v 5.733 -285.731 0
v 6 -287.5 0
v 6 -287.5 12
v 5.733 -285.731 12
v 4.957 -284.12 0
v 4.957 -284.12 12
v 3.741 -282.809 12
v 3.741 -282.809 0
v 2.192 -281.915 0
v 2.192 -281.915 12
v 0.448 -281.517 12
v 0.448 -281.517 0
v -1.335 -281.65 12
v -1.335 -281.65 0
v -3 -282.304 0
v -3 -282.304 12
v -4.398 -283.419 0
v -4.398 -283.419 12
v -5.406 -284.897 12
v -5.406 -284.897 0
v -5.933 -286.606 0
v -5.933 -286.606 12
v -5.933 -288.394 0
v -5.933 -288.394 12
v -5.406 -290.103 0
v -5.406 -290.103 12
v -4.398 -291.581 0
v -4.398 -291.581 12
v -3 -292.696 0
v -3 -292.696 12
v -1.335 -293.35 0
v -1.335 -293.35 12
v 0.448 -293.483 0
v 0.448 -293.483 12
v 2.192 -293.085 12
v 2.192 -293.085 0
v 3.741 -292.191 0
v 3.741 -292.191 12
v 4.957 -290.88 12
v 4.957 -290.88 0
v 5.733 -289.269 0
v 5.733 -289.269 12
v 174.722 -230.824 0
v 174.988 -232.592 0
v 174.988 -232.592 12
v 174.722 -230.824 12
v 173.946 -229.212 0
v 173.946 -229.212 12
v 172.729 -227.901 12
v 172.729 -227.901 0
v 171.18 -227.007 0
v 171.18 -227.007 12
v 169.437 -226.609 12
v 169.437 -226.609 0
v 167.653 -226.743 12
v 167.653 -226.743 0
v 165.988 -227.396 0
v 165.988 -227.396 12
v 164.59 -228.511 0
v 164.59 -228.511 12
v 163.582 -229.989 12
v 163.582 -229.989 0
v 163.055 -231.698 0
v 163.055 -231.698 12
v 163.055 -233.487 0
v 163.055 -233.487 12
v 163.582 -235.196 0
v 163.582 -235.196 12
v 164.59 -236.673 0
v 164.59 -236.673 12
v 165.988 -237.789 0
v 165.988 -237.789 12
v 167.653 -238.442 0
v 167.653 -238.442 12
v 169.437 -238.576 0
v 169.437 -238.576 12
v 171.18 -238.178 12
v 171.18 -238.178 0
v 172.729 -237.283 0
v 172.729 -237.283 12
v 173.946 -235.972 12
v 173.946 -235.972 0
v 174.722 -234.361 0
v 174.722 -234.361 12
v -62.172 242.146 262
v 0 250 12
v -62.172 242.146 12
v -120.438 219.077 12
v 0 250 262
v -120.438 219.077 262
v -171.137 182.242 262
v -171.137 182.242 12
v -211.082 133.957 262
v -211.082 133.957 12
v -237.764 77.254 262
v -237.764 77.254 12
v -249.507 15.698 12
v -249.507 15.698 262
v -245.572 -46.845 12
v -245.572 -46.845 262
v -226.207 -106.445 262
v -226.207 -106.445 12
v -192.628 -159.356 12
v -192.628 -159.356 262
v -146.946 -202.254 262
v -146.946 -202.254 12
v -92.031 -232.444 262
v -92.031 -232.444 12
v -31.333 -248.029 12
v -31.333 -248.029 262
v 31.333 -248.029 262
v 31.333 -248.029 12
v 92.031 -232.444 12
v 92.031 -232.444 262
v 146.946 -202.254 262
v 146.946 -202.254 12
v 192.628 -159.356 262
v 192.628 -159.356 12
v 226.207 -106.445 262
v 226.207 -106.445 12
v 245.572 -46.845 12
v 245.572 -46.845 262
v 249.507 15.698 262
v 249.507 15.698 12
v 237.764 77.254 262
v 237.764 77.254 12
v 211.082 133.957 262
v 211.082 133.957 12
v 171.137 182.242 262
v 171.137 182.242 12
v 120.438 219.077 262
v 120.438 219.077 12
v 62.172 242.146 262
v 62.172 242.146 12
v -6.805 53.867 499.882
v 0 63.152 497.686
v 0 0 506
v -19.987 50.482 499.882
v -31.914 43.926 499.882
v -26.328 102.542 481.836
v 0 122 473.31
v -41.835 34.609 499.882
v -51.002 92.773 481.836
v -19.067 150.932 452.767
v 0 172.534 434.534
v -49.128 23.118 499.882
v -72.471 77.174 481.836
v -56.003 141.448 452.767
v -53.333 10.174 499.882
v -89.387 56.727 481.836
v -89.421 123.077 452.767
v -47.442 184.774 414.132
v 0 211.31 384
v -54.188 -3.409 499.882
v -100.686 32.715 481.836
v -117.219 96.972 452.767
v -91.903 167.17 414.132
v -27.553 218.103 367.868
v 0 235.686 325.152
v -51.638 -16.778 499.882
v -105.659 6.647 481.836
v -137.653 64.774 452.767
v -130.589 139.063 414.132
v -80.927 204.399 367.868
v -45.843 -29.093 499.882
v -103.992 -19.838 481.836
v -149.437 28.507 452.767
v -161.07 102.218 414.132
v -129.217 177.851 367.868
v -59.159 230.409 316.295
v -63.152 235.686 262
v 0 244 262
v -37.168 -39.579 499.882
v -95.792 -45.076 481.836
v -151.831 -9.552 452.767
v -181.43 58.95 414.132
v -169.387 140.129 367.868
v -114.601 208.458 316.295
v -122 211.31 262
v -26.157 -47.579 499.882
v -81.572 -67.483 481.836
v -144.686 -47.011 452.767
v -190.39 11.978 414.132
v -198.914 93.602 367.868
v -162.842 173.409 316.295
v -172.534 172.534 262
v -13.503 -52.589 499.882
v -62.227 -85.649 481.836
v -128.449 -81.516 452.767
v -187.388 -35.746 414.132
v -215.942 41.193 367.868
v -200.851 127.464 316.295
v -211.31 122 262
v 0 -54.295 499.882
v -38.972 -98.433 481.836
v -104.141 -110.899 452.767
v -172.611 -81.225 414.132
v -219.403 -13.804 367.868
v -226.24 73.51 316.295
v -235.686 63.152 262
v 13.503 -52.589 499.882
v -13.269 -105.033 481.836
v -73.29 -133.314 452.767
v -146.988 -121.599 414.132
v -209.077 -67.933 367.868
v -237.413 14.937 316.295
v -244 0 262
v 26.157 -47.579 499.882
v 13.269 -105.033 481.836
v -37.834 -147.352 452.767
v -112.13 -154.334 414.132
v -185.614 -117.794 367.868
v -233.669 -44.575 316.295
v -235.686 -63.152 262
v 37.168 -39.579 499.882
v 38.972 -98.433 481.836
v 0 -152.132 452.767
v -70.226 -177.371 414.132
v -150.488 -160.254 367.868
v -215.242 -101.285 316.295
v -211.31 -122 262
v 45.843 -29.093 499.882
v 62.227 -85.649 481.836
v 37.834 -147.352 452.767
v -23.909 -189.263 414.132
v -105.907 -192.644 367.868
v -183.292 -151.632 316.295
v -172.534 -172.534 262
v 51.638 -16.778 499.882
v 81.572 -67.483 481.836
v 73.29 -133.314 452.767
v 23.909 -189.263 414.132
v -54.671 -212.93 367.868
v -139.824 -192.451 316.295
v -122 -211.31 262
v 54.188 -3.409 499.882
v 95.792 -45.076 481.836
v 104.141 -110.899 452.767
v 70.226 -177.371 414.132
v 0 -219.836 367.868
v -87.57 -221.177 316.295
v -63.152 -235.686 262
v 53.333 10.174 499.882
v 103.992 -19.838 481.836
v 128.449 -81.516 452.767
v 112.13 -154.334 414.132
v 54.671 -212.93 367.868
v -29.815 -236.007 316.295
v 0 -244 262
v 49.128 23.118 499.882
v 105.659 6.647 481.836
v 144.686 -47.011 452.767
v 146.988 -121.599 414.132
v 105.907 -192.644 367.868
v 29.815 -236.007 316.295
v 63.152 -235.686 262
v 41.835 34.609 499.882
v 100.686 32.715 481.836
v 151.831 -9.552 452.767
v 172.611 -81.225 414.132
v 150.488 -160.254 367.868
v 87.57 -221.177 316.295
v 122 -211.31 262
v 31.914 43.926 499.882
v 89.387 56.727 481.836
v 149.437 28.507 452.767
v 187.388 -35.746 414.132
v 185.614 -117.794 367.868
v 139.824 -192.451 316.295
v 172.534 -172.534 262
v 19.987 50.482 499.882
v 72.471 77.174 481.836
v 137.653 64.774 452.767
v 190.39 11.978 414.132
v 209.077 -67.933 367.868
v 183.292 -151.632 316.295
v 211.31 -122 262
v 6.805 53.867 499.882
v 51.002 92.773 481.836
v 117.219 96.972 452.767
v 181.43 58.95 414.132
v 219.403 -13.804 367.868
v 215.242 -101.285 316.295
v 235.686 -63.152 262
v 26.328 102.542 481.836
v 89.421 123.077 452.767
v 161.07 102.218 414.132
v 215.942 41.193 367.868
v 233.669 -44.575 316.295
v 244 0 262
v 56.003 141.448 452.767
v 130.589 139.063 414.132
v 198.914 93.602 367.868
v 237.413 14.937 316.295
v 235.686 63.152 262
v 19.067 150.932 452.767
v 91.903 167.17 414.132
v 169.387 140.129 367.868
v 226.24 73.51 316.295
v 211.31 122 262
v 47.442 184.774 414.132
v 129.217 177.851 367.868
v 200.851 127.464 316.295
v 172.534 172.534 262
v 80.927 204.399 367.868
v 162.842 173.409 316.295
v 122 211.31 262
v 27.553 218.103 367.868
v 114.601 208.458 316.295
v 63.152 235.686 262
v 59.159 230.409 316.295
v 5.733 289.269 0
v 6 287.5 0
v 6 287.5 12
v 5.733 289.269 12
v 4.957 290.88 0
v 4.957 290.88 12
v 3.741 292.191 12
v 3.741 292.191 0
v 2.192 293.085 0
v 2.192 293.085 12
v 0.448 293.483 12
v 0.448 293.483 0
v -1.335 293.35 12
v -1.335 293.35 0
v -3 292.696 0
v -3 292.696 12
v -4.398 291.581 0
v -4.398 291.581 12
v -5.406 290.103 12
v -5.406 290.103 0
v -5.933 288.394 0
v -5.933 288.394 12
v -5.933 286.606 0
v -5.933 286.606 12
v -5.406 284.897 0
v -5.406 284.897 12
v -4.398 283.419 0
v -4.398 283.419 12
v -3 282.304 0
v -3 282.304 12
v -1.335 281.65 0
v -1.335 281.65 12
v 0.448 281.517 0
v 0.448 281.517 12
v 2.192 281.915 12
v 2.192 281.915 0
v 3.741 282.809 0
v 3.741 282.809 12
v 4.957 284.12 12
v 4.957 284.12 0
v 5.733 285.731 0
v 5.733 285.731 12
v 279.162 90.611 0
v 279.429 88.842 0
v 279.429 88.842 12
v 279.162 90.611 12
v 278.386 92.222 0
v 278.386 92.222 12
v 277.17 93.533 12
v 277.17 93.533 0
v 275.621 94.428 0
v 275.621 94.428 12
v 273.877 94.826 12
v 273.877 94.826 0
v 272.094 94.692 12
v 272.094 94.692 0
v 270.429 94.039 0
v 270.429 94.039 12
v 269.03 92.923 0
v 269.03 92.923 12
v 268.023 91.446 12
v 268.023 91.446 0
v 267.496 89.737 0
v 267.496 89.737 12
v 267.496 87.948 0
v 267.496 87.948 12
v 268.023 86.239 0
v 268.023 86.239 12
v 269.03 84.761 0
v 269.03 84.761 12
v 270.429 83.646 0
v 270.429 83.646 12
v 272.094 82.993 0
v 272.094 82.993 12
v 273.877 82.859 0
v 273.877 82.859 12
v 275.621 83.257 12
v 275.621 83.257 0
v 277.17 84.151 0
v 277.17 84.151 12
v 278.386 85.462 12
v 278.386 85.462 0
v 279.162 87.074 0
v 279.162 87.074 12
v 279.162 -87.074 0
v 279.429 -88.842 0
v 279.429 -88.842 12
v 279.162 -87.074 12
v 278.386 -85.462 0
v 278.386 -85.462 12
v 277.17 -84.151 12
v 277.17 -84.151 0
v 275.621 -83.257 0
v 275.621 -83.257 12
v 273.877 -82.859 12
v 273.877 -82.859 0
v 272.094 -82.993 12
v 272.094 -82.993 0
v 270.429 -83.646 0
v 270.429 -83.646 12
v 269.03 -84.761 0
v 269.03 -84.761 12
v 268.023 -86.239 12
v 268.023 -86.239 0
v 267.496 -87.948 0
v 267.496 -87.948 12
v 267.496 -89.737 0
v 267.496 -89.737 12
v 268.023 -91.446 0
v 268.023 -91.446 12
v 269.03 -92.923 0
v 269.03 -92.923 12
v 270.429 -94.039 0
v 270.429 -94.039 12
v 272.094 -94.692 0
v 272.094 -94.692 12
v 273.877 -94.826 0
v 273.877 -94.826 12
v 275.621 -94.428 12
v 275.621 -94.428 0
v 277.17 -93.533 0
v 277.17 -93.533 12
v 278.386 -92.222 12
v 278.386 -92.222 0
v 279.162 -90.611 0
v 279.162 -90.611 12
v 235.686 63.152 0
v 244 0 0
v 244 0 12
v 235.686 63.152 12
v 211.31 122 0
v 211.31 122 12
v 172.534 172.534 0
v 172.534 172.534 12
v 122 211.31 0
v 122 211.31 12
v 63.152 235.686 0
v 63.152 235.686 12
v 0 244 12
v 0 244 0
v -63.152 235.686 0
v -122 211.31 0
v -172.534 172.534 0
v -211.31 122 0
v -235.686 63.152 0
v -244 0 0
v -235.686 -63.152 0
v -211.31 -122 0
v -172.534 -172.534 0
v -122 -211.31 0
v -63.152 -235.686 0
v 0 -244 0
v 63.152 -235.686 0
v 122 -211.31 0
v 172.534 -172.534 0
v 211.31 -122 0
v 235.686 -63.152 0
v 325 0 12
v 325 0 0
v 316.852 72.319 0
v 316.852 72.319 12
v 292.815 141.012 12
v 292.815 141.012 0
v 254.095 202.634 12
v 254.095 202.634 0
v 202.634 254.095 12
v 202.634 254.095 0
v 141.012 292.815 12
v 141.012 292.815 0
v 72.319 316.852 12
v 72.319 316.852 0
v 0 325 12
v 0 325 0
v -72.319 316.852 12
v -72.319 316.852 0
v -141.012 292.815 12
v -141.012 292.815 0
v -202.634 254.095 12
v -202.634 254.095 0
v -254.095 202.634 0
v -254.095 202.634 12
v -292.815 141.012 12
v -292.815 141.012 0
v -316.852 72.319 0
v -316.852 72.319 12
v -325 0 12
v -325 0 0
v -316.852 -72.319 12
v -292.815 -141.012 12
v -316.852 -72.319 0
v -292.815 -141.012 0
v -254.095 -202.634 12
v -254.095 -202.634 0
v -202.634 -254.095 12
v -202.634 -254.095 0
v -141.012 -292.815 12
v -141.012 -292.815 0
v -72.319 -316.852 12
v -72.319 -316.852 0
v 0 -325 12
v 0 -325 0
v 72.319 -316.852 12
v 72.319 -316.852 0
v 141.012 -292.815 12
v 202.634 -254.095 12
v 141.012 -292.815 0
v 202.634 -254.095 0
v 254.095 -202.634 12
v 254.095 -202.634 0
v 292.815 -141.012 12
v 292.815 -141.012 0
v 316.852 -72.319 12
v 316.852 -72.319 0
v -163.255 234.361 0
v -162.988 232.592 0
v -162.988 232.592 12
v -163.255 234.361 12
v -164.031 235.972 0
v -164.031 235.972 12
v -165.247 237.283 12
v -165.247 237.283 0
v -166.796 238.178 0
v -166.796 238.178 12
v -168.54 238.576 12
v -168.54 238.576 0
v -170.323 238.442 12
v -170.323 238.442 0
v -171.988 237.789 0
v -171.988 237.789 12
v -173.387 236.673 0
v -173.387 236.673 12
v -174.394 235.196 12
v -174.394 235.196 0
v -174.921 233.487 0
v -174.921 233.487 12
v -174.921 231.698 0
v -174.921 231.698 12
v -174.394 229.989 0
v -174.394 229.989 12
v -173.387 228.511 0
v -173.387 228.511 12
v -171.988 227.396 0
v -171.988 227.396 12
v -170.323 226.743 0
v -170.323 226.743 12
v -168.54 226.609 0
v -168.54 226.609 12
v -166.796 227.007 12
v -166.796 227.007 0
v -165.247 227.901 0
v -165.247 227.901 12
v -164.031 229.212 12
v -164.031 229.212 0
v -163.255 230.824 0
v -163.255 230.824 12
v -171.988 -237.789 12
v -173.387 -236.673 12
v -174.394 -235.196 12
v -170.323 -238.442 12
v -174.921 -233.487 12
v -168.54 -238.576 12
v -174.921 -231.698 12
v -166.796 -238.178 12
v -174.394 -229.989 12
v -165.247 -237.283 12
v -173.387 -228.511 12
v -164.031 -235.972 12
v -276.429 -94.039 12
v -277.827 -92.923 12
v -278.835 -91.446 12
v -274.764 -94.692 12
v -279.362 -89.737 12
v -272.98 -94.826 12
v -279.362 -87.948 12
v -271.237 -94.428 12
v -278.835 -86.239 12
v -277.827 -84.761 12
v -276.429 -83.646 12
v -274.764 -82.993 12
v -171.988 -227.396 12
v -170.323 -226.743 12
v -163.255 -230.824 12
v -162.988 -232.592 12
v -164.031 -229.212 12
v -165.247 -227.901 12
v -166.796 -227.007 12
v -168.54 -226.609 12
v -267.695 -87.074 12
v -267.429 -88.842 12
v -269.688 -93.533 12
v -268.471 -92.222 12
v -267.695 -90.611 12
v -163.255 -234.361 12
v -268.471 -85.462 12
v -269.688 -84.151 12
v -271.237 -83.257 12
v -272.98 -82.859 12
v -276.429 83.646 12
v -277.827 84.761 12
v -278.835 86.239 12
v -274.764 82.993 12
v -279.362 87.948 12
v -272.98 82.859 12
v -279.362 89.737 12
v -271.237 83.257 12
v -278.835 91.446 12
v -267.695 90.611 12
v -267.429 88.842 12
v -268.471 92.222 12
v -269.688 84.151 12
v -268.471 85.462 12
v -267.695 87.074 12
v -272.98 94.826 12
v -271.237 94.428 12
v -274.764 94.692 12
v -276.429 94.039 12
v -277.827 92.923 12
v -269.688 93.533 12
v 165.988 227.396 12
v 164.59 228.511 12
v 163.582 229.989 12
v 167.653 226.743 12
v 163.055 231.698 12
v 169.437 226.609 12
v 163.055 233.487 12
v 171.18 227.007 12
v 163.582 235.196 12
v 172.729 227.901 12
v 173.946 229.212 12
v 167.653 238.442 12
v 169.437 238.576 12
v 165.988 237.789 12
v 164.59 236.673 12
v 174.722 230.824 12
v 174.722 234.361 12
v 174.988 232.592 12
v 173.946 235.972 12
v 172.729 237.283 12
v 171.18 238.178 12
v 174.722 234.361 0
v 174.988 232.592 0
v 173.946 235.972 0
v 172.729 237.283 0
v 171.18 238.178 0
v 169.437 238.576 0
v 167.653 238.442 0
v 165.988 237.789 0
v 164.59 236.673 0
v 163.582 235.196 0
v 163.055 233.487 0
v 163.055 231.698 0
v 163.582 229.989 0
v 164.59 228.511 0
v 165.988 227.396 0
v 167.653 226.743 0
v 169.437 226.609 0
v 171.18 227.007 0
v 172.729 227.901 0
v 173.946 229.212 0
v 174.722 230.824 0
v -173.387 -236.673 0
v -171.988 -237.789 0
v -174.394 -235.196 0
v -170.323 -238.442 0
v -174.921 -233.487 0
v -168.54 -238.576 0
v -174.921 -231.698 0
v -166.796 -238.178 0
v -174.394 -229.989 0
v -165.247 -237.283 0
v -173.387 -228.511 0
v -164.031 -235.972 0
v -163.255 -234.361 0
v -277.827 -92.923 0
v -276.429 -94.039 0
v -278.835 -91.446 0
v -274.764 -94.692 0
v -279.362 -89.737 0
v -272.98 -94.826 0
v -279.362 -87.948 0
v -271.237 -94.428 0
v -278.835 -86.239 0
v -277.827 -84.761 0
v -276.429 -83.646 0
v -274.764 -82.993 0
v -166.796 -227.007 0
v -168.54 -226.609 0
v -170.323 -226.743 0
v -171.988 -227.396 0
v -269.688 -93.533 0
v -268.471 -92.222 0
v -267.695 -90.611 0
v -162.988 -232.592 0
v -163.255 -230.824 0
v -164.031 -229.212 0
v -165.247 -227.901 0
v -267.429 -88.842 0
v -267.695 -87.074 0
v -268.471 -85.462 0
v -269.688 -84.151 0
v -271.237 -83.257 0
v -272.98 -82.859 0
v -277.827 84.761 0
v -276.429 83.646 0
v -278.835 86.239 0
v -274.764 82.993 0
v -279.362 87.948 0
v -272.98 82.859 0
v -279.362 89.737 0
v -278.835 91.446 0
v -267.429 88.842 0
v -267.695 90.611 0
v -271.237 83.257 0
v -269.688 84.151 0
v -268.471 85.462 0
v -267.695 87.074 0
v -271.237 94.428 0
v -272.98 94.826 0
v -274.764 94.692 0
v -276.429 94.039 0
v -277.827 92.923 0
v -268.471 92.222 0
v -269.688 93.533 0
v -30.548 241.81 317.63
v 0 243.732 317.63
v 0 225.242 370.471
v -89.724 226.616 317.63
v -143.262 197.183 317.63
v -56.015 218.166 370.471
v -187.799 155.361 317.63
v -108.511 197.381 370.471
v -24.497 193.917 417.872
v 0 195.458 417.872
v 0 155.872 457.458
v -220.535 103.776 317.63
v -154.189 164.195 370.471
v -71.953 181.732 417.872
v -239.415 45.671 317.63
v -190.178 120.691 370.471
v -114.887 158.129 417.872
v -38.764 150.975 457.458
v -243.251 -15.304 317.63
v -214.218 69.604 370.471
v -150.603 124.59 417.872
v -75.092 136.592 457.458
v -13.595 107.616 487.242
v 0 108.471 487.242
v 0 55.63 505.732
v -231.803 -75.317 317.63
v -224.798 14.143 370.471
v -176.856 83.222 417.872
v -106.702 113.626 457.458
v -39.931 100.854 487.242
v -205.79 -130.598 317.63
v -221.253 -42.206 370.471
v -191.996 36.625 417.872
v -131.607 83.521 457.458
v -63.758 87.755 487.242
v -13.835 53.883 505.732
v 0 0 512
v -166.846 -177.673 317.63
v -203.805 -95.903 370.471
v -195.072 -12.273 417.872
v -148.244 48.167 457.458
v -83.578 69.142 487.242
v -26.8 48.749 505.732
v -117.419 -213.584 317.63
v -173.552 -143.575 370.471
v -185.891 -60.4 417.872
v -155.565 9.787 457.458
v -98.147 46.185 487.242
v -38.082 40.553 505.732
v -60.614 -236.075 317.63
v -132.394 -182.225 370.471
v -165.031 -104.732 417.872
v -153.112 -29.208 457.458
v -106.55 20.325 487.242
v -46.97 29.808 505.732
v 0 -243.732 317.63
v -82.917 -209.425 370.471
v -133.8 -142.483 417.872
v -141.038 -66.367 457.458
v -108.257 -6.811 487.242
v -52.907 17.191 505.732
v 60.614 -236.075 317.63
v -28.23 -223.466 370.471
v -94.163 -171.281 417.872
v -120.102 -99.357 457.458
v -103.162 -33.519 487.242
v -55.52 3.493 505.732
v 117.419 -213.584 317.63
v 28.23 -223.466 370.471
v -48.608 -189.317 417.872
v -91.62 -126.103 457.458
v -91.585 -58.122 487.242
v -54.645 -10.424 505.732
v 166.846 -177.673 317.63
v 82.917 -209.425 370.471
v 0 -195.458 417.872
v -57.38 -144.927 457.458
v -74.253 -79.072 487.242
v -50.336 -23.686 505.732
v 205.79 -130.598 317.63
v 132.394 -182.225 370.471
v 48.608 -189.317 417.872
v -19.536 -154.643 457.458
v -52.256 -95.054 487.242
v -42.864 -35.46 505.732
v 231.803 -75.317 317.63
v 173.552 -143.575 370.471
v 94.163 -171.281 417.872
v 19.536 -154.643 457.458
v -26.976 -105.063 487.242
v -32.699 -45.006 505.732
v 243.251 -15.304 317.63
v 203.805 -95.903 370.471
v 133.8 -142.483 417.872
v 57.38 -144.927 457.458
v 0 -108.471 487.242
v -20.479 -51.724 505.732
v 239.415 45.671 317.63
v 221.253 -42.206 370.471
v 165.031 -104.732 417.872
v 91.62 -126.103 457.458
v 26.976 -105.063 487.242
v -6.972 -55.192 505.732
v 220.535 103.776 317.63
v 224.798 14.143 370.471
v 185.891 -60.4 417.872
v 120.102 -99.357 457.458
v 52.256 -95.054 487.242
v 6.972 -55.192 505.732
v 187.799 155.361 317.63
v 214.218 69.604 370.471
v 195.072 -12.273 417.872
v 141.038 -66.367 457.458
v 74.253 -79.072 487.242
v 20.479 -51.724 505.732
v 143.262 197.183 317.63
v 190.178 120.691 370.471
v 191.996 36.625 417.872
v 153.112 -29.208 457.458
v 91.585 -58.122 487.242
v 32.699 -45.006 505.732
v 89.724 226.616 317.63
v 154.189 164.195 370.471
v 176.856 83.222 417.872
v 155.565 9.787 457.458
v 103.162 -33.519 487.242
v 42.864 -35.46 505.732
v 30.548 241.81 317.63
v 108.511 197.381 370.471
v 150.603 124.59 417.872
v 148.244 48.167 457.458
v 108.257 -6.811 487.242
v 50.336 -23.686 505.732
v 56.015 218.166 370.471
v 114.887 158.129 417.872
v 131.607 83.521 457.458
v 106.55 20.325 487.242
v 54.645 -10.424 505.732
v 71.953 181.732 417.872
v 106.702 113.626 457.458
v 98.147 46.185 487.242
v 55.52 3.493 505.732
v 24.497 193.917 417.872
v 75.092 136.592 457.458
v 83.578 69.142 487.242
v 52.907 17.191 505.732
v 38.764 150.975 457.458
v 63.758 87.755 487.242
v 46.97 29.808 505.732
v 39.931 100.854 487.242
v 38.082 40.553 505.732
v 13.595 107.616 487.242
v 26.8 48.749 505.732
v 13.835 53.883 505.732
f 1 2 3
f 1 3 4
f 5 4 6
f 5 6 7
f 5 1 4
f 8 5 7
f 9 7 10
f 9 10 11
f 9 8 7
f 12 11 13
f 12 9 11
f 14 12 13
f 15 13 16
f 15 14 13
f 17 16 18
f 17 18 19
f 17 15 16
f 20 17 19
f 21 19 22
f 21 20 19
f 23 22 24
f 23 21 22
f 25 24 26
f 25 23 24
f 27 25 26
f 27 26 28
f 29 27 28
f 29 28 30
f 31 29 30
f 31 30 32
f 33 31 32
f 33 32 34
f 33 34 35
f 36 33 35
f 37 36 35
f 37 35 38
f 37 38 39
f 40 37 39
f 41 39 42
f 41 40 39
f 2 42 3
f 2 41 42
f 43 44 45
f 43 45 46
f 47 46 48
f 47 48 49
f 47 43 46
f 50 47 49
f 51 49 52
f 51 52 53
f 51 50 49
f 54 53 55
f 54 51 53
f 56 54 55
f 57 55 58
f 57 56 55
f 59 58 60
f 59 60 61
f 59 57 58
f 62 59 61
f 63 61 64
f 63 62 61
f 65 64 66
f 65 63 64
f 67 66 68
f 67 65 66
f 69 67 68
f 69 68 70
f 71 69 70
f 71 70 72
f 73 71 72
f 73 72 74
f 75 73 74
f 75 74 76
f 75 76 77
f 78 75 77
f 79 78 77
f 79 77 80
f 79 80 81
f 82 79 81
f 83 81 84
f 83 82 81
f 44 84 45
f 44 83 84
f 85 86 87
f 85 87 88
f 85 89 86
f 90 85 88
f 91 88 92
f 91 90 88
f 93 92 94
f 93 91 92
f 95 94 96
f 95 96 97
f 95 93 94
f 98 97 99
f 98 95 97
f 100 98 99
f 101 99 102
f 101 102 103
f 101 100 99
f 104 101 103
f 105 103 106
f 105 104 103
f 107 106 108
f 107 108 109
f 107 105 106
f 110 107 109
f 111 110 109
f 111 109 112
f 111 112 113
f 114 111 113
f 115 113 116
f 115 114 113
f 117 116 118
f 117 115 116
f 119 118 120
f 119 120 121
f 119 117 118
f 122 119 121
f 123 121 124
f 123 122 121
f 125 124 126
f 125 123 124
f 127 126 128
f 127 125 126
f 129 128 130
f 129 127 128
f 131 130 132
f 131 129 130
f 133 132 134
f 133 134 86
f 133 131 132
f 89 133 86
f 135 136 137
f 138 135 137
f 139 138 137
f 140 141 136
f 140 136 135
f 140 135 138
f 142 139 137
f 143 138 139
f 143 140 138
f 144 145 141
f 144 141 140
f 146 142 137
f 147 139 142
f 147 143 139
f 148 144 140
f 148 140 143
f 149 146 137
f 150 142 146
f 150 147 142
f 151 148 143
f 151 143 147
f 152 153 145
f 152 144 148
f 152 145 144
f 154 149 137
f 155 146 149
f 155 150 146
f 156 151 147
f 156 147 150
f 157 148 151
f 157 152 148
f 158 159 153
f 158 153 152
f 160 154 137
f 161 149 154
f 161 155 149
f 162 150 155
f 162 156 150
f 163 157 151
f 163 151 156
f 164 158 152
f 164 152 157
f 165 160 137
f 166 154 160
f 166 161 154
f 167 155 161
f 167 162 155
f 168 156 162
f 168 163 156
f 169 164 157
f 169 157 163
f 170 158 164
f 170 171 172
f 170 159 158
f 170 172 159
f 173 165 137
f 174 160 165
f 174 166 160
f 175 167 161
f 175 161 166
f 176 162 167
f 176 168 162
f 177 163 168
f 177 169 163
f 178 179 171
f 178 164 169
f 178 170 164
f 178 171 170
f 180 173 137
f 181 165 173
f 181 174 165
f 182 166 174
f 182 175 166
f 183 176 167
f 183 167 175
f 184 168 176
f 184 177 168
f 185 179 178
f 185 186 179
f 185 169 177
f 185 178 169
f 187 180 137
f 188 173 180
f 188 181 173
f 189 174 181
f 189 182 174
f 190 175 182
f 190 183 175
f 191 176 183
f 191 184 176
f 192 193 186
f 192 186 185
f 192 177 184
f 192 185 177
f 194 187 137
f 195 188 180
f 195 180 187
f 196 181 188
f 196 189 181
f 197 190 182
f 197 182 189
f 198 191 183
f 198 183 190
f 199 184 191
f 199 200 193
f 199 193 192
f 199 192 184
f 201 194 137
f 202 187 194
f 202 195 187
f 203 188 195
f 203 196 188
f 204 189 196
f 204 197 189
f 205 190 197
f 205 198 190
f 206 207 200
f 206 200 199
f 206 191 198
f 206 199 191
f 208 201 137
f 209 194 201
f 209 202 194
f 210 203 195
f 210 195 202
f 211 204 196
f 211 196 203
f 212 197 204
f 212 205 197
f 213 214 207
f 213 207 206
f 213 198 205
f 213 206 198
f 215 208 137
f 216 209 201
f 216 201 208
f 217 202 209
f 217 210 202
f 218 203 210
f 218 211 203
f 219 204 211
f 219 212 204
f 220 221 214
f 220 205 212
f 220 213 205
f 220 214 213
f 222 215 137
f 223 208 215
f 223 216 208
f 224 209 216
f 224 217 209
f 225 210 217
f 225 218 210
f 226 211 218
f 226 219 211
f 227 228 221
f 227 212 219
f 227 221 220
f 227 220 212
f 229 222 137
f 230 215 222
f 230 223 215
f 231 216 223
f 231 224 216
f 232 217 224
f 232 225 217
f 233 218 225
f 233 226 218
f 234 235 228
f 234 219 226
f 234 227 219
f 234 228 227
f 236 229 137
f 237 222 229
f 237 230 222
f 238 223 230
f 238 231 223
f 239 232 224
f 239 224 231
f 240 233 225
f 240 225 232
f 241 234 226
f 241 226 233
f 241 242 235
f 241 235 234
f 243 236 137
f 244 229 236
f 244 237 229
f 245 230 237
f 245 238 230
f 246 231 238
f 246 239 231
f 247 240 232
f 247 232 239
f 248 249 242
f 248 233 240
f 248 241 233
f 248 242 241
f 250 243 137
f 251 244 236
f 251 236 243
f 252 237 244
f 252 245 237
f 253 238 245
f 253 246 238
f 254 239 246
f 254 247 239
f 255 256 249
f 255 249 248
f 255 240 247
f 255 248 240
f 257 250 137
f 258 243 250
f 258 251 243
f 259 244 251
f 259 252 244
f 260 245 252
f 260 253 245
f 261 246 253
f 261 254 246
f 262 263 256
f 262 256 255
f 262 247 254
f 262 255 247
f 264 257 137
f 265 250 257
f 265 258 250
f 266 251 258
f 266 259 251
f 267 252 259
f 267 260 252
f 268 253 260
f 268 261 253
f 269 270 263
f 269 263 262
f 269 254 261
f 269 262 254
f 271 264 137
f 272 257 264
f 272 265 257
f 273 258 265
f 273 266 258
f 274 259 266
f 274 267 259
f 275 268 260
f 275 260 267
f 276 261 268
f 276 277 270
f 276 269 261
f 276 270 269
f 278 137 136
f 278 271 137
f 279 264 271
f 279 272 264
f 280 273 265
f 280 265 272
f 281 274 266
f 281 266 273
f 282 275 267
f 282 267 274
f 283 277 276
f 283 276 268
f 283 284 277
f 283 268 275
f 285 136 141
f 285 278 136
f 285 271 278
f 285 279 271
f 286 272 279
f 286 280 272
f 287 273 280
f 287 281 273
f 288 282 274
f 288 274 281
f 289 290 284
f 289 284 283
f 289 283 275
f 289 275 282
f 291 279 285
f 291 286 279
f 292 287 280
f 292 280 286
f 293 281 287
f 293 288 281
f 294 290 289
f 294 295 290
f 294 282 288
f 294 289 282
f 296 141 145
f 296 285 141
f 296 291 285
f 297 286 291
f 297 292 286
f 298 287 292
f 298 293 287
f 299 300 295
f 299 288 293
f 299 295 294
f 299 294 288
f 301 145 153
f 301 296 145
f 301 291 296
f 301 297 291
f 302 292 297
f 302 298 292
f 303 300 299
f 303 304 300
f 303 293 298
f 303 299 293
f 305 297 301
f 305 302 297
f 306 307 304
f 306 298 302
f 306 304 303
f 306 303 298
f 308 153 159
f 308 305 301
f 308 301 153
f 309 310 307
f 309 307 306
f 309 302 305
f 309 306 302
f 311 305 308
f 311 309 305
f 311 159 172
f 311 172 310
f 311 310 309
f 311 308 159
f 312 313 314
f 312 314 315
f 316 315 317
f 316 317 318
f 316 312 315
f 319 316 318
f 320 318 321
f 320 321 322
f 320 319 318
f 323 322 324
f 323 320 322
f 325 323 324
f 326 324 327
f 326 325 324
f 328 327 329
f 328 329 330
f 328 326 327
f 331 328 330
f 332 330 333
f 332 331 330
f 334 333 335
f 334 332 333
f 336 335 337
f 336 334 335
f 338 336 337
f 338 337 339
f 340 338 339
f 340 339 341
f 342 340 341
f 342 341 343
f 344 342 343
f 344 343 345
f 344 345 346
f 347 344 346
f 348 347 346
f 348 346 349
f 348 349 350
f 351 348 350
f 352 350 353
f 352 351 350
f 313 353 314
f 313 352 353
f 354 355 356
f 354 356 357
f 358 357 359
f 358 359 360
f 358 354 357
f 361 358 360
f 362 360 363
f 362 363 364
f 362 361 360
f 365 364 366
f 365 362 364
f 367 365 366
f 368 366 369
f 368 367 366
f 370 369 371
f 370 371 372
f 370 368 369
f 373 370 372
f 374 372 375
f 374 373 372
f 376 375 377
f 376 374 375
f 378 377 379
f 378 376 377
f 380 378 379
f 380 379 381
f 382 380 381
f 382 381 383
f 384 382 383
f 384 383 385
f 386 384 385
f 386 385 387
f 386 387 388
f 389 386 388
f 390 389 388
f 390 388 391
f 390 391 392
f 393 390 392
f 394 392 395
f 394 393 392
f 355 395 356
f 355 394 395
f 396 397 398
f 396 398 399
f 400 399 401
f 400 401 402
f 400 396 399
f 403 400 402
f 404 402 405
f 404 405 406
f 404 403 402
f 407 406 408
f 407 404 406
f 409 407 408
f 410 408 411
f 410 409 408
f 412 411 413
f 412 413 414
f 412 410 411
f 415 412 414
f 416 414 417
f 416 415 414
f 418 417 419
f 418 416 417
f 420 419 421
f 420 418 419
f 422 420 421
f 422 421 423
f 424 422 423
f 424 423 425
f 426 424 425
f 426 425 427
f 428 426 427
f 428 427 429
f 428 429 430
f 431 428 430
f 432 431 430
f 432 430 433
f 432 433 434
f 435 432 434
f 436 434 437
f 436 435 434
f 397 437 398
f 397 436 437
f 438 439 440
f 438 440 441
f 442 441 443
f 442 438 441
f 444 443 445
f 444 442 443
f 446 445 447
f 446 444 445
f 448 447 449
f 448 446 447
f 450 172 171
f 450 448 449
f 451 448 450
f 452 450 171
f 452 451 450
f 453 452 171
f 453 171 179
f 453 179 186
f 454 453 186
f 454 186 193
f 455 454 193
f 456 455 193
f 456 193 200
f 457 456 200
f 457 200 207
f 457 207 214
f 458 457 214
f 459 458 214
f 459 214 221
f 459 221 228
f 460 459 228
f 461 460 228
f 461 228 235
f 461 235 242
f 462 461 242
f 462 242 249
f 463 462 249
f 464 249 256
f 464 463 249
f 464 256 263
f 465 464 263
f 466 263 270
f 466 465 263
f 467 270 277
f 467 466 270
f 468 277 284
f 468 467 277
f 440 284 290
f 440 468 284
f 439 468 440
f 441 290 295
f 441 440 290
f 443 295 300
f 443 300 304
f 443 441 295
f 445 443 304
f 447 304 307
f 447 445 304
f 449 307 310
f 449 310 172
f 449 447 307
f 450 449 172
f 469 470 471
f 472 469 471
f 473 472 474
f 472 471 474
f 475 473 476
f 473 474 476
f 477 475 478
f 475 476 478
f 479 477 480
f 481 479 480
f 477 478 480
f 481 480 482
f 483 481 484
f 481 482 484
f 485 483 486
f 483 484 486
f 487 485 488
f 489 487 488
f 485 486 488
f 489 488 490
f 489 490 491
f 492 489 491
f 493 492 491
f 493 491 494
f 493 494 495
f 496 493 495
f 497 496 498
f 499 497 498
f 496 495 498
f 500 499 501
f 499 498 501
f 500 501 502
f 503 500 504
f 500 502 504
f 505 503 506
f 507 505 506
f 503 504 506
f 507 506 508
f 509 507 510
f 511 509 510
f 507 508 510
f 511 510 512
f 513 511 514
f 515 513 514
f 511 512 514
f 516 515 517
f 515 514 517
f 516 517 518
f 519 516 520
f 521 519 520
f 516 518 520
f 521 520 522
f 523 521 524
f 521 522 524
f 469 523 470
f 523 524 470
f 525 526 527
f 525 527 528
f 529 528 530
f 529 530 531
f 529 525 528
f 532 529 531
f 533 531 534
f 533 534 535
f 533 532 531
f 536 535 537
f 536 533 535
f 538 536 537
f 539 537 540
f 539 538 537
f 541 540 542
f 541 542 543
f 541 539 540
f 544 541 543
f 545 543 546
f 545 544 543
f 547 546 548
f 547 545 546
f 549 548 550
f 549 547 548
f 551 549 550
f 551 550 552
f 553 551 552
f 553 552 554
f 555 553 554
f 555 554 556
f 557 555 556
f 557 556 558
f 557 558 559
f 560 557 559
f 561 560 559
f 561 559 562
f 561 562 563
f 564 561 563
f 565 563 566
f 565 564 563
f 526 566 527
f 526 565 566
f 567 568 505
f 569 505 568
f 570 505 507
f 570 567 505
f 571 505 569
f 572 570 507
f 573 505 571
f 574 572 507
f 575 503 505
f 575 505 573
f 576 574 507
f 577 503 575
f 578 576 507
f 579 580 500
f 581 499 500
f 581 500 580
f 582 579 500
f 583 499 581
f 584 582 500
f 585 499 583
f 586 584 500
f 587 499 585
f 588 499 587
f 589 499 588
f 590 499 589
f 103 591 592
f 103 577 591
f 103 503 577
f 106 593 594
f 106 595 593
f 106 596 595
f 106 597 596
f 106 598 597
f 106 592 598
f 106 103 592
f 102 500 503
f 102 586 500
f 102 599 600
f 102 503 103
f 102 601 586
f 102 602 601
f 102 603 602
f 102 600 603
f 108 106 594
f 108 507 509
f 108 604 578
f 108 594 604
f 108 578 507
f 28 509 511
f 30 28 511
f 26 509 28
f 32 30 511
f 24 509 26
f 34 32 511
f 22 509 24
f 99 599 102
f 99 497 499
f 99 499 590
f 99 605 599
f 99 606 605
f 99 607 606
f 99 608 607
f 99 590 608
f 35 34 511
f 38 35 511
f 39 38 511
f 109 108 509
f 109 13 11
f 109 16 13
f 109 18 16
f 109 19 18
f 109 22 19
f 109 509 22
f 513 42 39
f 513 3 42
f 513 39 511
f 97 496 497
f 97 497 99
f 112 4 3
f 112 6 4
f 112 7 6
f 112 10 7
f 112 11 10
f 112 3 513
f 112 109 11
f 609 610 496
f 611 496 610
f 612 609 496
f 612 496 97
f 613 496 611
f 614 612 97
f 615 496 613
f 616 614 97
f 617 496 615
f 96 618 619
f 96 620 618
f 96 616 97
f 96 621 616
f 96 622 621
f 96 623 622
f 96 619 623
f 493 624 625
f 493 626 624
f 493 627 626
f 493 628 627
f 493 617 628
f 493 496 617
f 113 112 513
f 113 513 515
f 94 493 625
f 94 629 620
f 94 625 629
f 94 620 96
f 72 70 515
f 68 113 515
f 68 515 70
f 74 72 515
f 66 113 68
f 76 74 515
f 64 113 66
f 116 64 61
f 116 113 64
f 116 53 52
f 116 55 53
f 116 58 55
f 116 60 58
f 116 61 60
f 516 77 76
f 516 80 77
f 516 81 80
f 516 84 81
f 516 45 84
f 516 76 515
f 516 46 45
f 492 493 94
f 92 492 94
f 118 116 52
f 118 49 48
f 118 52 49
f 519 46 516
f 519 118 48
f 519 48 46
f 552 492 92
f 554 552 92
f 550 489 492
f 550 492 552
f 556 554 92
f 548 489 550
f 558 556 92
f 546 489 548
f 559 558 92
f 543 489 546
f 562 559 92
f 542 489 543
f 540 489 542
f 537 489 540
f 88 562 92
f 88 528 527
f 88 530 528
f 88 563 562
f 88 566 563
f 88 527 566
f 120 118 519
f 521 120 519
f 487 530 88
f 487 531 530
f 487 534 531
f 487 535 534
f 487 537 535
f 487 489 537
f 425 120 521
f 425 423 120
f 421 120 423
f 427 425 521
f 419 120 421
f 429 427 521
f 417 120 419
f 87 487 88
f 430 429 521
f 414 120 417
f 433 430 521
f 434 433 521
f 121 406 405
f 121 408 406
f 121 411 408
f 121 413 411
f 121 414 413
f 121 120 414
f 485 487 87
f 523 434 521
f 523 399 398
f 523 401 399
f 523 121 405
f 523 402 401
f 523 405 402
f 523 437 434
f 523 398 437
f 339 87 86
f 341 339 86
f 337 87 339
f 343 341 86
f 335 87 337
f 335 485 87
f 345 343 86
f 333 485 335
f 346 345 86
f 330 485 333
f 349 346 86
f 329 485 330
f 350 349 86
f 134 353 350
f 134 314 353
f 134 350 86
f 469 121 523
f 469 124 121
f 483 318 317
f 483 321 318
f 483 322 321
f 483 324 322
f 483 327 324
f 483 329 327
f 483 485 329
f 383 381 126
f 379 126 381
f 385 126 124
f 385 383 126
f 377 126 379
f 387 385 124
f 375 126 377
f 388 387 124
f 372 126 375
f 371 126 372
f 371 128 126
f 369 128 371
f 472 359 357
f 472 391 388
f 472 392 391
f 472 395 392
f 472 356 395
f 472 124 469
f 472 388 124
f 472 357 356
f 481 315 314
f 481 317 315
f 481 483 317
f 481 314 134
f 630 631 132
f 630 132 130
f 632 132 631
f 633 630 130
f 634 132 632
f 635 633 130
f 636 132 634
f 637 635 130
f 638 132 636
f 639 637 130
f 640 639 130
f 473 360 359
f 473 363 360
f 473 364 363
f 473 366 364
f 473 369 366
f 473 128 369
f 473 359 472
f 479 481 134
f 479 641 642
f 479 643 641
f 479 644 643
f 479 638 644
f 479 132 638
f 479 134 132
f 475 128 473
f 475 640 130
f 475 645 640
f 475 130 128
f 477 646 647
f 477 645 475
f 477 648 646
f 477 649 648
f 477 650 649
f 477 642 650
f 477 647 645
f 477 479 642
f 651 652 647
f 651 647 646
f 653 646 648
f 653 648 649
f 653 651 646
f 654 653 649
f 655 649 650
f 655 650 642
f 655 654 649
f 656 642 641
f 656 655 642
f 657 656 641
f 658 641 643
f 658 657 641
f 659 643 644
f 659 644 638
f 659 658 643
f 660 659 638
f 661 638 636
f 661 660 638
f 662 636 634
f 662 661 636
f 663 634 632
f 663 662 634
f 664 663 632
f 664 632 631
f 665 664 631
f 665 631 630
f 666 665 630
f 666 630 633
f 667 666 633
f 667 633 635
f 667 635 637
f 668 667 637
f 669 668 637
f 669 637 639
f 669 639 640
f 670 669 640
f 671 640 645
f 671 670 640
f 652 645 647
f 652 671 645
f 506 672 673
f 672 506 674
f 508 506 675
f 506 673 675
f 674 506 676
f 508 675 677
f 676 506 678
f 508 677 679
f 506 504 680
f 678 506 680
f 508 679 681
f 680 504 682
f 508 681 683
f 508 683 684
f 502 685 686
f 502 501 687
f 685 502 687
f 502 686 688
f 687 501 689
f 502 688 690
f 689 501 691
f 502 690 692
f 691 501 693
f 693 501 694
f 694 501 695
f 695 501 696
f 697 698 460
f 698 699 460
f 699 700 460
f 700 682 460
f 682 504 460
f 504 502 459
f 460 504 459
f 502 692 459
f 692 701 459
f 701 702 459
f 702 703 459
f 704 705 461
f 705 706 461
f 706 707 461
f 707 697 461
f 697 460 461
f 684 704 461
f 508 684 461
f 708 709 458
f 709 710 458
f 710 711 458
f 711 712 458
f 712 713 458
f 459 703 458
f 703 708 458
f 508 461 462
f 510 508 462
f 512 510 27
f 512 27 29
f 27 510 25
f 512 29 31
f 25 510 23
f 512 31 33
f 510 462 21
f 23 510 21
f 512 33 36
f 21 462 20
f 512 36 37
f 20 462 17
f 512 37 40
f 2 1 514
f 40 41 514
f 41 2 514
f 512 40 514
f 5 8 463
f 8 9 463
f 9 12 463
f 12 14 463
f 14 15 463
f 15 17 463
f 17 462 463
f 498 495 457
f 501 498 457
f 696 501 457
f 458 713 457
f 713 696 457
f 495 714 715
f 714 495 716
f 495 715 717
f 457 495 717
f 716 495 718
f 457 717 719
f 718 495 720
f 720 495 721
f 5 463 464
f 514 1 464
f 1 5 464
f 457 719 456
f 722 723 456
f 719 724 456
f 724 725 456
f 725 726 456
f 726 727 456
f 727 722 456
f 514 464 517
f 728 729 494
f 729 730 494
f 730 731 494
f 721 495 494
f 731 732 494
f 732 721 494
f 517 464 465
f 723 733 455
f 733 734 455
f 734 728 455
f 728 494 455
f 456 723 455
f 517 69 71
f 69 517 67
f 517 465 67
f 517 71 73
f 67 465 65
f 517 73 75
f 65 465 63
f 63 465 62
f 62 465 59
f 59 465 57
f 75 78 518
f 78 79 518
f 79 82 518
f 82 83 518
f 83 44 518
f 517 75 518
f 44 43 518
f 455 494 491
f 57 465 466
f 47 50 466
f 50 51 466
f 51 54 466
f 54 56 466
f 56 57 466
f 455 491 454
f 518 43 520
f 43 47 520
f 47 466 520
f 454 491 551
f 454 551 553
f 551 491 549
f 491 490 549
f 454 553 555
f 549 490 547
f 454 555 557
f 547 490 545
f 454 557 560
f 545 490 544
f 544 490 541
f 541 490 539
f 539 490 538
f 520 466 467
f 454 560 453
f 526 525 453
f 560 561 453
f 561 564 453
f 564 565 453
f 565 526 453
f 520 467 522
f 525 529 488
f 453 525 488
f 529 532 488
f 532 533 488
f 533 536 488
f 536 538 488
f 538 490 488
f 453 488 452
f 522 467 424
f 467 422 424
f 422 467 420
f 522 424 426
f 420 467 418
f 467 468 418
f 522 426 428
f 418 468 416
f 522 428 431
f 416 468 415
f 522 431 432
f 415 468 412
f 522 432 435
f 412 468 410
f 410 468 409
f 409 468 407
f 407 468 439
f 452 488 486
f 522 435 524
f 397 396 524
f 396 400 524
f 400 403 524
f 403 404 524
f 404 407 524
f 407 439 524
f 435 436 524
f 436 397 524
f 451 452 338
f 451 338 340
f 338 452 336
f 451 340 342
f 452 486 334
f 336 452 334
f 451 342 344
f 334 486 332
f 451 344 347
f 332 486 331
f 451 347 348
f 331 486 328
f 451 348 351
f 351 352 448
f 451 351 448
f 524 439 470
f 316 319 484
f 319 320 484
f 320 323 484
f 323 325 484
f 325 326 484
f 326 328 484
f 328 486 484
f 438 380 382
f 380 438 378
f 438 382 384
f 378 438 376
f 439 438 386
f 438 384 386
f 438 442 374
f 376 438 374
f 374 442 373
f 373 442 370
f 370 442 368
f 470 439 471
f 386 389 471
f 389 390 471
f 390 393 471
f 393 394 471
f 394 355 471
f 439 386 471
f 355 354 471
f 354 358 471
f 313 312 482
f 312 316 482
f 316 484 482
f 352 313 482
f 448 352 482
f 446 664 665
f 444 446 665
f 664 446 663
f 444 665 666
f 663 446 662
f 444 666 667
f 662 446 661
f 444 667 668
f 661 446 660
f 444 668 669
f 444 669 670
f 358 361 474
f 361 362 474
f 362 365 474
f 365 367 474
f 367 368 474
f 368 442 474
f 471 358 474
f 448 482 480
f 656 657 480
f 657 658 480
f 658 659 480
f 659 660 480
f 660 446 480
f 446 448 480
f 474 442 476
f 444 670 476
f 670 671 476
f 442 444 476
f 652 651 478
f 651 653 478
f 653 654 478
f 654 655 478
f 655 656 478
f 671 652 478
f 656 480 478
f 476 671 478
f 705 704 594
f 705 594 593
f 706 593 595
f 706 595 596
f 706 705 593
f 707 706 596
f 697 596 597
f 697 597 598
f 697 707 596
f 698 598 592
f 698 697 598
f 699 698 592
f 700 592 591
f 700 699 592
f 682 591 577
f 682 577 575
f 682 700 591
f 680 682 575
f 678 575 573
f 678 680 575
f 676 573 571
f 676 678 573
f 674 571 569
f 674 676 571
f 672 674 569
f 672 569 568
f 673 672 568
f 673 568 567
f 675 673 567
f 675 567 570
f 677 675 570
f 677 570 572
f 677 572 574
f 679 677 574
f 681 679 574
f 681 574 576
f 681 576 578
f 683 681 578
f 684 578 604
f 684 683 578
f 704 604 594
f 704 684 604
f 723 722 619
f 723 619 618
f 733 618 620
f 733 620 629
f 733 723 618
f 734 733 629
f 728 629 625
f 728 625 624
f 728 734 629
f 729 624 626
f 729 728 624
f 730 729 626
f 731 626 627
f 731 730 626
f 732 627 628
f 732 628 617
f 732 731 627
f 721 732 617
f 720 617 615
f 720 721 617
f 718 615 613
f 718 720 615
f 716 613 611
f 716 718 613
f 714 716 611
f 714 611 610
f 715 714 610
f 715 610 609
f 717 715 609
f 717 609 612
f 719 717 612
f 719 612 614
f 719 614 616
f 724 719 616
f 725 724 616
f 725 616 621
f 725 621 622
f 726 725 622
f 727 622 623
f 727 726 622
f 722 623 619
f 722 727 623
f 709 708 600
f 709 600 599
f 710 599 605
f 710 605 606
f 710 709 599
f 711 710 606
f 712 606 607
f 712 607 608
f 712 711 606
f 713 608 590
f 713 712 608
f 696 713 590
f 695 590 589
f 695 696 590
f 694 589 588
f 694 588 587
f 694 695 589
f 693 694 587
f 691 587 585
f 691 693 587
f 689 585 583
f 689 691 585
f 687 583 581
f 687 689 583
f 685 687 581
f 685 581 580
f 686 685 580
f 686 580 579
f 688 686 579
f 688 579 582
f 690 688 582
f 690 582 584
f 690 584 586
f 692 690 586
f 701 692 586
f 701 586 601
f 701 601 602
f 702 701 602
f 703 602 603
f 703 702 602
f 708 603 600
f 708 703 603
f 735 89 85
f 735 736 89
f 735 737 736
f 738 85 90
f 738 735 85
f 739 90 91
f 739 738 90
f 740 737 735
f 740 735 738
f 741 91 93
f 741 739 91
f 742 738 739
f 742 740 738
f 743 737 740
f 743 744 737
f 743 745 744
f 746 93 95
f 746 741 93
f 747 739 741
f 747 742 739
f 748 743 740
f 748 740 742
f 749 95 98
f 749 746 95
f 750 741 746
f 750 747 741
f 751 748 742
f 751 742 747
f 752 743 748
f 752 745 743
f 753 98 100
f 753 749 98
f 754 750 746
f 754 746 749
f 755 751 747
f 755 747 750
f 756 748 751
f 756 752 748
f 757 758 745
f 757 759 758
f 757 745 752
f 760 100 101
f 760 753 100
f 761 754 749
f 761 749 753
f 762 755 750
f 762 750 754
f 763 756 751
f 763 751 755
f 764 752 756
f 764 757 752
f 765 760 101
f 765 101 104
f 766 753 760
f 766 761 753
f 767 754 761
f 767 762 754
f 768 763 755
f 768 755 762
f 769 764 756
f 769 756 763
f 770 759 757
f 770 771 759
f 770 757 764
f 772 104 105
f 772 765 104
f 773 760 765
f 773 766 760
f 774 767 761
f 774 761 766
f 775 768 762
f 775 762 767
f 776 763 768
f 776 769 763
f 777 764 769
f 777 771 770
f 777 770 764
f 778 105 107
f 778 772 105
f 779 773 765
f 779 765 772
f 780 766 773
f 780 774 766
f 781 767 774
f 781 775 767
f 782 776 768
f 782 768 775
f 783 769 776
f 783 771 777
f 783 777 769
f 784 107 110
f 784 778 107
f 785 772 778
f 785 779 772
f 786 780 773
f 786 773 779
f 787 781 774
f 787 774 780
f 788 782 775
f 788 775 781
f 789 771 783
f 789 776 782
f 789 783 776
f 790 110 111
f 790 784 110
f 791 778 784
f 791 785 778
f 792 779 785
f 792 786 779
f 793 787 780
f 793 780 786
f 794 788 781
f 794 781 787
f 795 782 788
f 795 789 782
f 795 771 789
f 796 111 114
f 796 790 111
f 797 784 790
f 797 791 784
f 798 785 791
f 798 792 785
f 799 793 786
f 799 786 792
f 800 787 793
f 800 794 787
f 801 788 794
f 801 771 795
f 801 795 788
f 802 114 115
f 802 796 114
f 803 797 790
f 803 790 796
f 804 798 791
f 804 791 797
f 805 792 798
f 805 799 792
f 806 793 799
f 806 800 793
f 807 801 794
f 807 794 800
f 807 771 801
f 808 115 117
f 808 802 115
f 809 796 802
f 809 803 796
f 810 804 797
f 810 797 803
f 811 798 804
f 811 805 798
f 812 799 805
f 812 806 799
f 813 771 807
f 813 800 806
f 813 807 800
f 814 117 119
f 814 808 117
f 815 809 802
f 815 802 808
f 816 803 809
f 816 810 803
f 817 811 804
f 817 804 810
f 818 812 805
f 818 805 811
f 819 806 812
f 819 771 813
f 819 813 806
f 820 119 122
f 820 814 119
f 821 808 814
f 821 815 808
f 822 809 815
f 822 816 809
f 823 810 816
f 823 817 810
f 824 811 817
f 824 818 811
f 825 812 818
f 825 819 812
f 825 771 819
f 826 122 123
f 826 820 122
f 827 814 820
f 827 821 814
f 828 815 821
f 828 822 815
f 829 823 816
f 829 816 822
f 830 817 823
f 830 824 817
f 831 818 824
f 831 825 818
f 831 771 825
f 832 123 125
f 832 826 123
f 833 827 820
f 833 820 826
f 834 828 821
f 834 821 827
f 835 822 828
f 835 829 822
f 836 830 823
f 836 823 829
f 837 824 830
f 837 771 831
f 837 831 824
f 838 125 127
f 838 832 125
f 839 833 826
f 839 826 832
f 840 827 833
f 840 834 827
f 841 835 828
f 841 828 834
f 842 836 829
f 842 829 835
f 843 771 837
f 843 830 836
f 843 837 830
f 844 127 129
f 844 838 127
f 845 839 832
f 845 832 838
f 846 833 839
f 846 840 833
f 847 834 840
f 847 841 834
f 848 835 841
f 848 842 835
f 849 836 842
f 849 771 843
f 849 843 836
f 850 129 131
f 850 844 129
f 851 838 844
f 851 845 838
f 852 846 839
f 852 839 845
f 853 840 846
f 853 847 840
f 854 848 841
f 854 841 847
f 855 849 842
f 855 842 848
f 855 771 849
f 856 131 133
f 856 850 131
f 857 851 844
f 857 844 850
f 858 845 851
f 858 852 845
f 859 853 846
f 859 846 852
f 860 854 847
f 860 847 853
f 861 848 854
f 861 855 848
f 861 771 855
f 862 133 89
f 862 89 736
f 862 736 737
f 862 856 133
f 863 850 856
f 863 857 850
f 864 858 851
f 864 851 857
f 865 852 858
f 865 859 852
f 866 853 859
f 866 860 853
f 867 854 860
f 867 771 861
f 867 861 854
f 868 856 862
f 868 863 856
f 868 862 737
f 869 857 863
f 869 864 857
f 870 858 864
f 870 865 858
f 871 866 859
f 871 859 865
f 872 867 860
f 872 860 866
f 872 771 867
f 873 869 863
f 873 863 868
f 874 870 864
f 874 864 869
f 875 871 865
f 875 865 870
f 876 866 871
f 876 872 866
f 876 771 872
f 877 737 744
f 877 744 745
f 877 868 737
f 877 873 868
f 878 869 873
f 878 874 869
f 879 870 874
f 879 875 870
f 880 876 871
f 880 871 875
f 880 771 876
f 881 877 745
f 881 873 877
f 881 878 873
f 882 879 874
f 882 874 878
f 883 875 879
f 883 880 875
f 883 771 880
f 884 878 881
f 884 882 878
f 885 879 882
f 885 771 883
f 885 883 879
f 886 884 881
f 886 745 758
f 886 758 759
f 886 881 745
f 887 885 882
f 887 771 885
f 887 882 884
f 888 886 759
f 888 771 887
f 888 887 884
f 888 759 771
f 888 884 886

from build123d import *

# Parameters (mm, degrees)
SKETCH1_R           = 325
SKETCH1_R_2         = 6
SKETCH1_R_3         = 244
BOSS_EXTRUDE1_DEPTH = 12


with BuildPart() as part:
    # Sketch1 → Boss-Extrude1 (new body)
    with BuildSketch(Plane.XY):
        Circle(SKETCH1_R)
        with Locations((0, 287.5)):
            Circle(SKETCH1_R_2, mode=Mode.SUBTRACT)
        with Locations((168.988260034, 232.592385883)):
            Circle(SKETCH1_R_2, mode=Mode.SUBTRACT)
        with Locations((273.428748435, 88.842385883)):
            Circle(SKETCH1_R_2, mode=Mode.SUBTRACT)
        with Locations((273.428748435, -88.842385883)):
            Circle(SKETCH1_R_2, mode=Mode.SUBTRACT)
        with Locations((168.988260034, -232.592385883)):
            Circle(SKETCH1_R_2, mode=Mode.SUBTRACT)
        with Locations((0, -287.5)):
            Circle(SKETCH1_R_2, mode=Mode.SUBTRACT)
        with Locations((-168.988260034, -232.592385883)):
            Circle(SKETCH1_R_2, mode=Mode.SUBTRACT)
        with Locations((-273.428748435, -88.842385883)):
            Circle(SKETCH1_R_2, mode=Mode.SUBTRACT)
        with Locations((-273.428748435, 88.842385883)):
            Circle(SKETCH1_R_2, mode=Mode.SUBTRACT)
        with Locations((-168.988260034, 232.592385883)):
            Circle(SKETCH1_R_2, mode=Mode.SUBTRACT)
        Circle(SKETCH1_R_3, mode=Mode.SUBTRACT)
    extrude(amount=BOSS_EXTRUDE1_DEPTH)

    # Sketch4 → Revolve2 (revolve)
    with BuildSketch(Plane(origin=(0, 0, 0), x_dir=(0, 0, -1), z_dir=(1, 0, 0))):
        with BuildLine():
            Line((-12, 250), (-262, 250))
            ThreePointArc((-262, 250), (-438.776695297, 176.776695297), (-512, 0))
            Line((-512, 0), (-506, 0))
            ThreePointArc((-506, 0), (-434.53405461, 172.53405461), (-262, 244))
            Line((-262, 244), (-12, 244))
            Line((-12, 244), (-12, 250))
        make_face()
    revolve(axis=Axis((0, 0, 12), (0, 0, 1)))


solid = part.part
